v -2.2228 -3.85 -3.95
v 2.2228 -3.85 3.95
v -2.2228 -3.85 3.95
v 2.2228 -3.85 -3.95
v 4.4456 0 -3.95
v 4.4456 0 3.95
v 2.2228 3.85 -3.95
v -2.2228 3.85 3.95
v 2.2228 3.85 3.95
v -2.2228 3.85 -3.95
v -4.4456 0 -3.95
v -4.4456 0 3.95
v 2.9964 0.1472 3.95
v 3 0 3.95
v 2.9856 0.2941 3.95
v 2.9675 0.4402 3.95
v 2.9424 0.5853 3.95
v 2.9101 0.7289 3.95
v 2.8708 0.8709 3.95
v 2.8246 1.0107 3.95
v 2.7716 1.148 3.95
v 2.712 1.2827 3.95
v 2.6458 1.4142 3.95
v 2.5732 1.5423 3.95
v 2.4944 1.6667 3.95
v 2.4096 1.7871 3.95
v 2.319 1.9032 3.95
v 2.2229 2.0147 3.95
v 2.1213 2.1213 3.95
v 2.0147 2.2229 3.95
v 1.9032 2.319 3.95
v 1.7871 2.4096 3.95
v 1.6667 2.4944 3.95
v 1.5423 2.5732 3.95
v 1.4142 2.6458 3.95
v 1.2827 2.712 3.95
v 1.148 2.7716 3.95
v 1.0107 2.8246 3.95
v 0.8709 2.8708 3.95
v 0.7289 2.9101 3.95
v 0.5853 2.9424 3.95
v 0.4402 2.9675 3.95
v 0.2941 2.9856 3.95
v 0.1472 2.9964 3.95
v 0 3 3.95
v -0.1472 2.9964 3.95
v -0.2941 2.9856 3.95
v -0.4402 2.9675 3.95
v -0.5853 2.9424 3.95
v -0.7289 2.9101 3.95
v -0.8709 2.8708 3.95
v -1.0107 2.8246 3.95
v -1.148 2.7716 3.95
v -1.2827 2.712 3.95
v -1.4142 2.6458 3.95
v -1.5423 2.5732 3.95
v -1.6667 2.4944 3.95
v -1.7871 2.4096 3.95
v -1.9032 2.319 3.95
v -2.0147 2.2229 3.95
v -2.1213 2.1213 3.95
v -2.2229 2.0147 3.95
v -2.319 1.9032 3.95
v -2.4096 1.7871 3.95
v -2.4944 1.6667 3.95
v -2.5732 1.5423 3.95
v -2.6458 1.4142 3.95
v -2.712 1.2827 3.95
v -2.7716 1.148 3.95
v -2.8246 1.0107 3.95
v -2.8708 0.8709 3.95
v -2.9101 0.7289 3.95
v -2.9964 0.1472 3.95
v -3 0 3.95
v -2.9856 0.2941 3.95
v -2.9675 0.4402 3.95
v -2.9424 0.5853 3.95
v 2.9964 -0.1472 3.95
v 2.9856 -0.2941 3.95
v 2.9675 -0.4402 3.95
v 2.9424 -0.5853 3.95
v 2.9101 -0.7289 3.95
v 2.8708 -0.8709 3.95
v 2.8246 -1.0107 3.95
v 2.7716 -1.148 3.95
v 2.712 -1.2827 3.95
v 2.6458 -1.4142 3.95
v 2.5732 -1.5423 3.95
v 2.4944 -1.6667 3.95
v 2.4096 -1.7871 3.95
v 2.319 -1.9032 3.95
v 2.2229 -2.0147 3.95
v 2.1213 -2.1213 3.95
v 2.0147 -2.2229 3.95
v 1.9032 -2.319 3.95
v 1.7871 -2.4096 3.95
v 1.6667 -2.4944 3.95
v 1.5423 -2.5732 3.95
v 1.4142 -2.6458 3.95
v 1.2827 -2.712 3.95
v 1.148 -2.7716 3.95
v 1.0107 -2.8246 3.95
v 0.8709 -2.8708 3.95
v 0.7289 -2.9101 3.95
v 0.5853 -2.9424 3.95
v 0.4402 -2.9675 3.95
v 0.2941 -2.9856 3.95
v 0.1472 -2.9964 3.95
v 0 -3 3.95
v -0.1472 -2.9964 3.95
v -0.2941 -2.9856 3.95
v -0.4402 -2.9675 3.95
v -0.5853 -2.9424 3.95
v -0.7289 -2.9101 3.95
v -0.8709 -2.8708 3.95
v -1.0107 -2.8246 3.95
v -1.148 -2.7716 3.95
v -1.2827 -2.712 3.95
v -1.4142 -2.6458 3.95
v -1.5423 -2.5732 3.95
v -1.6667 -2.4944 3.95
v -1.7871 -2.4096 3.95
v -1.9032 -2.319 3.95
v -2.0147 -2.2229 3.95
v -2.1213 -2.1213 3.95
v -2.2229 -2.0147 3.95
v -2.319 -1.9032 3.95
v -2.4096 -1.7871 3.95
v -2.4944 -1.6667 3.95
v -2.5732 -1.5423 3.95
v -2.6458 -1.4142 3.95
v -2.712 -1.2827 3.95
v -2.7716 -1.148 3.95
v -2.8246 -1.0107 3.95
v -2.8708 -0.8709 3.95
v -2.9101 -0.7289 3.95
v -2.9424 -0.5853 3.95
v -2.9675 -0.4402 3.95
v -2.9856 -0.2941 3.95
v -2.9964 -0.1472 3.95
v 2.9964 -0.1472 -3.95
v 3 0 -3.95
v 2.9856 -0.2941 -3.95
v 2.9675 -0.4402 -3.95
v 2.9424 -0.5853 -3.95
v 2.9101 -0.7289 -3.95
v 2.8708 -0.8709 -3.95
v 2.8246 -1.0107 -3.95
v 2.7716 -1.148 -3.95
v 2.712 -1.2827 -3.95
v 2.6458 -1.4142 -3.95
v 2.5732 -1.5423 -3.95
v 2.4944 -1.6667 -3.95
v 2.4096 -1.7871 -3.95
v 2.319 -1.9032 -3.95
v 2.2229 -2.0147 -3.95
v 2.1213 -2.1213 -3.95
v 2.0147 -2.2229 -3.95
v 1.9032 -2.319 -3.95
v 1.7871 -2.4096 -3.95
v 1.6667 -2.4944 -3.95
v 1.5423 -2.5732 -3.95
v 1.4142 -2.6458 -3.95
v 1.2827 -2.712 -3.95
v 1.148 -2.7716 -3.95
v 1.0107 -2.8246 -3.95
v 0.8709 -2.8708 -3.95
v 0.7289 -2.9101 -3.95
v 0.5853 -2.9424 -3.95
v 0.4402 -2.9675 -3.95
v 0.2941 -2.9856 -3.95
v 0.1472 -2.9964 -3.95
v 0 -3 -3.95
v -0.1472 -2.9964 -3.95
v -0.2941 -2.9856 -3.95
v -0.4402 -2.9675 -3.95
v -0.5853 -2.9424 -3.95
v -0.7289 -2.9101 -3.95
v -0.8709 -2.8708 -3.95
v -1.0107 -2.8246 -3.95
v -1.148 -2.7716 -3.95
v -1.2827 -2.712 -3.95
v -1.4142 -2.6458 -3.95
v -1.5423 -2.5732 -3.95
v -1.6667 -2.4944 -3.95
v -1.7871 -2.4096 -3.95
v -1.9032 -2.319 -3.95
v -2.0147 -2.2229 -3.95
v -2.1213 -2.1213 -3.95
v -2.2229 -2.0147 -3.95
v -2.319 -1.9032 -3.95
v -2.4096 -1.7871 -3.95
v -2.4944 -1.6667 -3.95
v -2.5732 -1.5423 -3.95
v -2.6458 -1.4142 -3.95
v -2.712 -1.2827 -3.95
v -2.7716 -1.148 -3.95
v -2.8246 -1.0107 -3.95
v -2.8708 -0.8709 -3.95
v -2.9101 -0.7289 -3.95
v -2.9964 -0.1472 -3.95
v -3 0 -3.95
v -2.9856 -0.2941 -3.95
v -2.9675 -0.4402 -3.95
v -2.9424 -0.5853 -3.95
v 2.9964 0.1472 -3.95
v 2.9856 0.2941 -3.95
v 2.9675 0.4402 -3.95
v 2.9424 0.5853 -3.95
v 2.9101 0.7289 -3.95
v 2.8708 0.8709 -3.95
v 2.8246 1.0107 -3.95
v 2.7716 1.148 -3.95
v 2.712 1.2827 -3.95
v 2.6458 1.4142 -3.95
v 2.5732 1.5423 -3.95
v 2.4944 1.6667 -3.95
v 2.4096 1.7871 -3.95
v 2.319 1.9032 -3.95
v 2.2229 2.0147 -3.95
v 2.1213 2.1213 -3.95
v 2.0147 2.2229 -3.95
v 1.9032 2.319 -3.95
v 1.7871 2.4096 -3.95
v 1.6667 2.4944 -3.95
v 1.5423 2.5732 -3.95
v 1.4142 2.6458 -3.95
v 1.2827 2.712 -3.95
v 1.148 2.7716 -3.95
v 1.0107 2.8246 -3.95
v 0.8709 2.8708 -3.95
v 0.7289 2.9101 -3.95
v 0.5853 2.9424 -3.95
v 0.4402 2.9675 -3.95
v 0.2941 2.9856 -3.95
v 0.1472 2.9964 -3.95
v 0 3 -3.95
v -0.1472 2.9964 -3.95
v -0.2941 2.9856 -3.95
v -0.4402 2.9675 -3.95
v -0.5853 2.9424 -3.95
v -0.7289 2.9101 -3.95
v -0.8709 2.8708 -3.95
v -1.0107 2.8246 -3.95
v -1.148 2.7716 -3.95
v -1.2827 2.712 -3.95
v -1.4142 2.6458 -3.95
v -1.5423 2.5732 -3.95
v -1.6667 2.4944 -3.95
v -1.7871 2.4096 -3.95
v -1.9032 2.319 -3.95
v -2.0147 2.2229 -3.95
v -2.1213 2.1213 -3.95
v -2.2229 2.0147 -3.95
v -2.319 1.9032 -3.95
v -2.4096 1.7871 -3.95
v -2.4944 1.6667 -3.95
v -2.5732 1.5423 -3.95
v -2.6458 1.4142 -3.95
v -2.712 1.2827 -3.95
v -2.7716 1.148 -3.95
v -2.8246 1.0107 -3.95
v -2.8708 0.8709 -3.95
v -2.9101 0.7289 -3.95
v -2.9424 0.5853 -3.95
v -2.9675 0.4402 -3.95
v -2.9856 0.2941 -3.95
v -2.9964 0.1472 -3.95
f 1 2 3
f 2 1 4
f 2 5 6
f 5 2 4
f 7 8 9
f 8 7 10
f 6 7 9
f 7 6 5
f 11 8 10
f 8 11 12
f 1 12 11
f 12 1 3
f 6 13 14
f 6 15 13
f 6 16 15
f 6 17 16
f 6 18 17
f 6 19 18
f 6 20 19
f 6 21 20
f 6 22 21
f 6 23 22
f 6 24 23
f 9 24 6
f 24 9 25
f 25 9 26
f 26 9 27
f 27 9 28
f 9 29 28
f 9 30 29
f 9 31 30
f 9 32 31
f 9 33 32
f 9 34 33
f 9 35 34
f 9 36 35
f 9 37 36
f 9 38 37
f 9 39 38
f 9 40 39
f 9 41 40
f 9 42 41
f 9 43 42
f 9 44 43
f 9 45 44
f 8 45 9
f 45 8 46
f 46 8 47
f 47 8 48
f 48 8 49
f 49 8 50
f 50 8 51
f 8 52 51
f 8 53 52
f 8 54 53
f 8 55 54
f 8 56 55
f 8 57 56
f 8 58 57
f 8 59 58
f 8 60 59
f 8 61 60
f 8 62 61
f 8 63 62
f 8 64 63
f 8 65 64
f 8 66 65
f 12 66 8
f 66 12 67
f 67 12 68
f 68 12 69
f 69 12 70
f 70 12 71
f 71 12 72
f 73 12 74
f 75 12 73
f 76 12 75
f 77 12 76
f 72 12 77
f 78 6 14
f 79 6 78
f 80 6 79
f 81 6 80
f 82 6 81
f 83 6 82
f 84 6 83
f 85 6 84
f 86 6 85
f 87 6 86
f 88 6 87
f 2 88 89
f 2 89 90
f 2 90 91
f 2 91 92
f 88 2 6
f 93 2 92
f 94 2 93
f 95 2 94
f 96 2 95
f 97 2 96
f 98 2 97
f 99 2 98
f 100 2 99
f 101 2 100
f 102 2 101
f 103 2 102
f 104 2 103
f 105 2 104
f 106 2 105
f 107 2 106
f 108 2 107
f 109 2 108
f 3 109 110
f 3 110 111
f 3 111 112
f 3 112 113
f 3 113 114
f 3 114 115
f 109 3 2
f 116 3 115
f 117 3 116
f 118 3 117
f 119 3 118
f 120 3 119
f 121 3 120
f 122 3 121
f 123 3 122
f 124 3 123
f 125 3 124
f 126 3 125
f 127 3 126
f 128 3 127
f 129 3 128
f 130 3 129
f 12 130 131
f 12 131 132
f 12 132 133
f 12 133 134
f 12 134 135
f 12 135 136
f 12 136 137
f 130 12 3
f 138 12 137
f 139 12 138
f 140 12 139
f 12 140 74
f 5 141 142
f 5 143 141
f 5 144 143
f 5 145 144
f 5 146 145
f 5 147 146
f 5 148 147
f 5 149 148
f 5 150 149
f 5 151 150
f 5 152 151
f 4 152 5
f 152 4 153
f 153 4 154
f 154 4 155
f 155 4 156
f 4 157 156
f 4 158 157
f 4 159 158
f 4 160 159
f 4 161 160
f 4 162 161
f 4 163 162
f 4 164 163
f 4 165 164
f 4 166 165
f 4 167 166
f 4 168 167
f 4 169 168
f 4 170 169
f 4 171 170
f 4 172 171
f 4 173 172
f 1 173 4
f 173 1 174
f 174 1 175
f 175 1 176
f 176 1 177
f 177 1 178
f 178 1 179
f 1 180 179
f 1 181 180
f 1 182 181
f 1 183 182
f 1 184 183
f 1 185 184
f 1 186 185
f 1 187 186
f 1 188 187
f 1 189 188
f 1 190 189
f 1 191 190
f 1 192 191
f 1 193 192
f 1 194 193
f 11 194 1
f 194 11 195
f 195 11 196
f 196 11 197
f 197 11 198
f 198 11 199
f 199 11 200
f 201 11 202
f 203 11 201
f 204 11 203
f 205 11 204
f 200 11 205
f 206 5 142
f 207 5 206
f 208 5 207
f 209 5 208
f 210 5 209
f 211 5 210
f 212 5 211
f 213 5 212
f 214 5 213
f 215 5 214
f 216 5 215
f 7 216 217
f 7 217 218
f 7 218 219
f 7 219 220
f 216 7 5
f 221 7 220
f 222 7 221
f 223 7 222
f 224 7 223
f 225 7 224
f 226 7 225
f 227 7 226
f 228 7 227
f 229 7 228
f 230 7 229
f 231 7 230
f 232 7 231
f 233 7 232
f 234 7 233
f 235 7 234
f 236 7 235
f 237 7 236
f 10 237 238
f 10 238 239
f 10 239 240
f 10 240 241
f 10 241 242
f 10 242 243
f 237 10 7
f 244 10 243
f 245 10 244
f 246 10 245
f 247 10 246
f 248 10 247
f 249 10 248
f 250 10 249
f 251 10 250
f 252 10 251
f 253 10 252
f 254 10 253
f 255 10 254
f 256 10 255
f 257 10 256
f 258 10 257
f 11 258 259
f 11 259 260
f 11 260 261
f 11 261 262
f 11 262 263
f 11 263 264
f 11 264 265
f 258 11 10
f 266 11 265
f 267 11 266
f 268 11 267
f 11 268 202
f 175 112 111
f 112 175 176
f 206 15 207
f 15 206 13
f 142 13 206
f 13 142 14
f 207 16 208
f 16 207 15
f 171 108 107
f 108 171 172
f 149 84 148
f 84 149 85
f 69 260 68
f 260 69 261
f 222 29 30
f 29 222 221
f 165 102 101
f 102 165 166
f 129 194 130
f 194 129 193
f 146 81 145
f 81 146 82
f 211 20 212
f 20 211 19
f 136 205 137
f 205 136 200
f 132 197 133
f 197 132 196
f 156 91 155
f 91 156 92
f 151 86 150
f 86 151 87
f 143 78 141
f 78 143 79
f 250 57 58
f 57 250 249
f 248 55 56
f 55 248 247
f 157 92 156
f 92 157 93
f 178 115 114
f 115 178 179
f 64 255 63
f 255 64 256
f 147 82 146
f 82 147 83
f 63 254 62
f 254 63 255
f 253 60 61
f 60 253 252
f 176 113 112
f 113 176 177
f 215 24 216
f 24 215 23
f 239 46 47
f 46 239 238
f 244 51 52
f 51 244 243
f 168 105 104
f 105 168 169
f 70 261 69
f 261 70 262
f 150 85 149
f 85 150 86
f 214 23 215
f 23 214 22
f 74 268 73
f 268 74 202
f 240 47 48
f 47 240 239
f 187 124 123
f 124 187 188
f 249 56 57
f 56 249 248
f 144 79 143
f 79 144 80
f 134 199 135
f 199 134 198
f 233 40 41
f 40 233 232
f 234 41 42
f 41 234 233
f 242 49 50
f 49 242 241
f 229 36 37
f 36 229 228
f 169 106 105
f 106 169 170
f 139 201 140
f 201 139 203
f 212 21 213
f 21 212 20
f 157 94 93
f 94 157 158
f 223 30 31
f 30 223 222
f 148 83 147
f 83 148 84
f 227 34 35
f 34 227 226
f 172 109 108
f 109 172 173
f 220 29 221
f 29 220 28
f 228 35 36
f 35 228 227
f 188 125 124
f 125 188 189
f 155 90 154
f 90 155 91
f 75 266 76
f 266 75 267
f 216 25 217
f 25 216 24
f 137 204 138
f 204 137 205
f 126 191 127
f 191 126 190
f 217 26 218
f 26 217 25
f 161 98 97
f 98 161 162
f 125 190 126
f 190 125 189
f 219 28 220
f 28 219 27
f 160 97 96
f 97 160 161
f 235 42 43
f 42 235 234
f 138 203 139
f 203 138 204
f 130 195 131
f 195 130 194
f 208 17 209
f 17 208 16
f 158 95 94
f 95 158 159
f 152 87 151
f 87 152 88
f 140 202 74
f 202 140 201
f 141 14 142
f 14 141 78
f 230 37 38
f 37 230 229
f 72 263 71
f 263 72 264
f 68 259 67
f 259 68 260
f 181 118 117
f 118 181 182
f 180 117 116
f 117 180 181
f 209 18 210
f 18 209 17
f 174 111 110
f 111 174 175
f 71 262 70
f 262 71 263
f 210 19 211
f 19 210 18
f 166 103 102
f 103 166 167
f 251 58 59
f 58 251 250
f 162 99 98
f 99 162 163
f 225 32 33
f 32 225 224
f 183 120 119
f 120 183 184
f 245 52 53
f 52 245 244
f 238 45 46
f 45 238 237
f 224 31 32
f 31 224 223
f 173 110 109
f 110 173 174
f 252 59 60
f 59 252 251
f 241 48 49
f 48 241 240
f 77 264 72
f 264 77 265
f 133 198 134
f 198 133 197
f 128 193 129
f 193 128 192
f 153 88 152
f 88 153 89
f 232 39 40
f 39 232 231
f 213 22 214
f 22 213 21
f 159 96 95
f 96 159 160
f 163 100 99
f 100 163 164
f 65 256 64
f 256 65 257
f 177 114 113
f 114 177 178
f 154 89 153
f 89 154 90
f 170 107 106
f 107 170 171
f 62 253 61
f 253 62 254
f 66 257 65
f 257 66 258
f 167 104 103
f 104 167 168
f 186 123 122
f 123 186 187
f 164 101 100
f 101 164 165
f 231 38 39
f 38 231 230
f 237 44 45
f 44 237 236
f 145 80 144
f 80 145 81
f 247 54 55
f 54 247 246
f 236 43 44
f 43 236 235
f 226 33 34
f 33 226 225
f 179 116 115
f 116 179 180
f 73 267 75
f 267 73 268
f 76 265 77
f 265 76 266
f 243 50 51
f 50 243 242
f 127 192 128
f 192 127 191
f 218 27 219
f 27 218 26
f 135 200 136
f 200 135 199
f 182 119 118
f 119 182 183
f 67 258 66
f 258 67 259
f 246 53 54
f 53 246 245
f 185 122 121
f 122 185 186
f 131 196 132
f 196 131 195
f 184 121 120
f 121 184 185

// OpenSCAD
// Hex nut for 6.0mm screws
// Target: 7.7mm across flats, 7.9mm thick, through-hole 6.0mm

thread_nominal_diameter_mm = 6; //[3:12:0.1]
across_flats_mm = 7.7;          //[3.85:15.4:0.1]
thickness_mm = 7.9;             //[3.95:15.8:0.1]
bore_diameter_mm = 6;           //[3:12:0.1]

// 0 = clearance/tap representation (smooth cylinder), 1 = cosmetic thread (not used here)
bore_type = 0;                  //[0:1:1]

chamfer_top_mm = 0;             //[0:2:0.1]
chamfer_bottom_mm = 0;          //[0:2:0.1]

// Small epsilon for robust boolean ops (keep tiny to avoid visible artifacts)
eps_mm = 0.02;                  //[0.01:0.2:0.01]

// Optional washer (disabled by default). If enabled, it is fused to nut (one connected solid).
washer_enabled = 0;             //[0:1:1]
washer_outer_diameter_mm = 12;  //[6:24:0.1]
washer_thickness_mm = 1.6;      //[0.8:3.2:0.1]

// Derived
hex_R = across_flats_mm / (2 * cos(30)); // circumradius that yields correct across-flats
bore_r = bore_diameter_mm / 2;

module hex_nut_body() {
    // Hex prism centered at origin
    cylinder(r = hex_R, h = thickness_mm, center = true, $fn = 6);
}

module bore_cut() {
    // High $fn to avoid faceted/stepped appearance
    cylinder(r = bore_r, h = thickness_mm + 2*eps_mm, center = true, $fn = 128);
}

module chamfer_cut(z_sign, chamfer_h) {
    // z_sign: +1 for top, -1 for bottom
    // Use a conical frustum to bevel the outer edge without removing the whole face.
    // Outer radius slightly larger than hex_R to guarantee full intersection.
    zc = z_sign * (thickness_mm/2 - chamfer_h/2);
    translate([0, 0, zc])
        cylinder(
            h = chamfer_h + 2*eps_mm,
            r1 = hex_R + eps_mm,
            r2 = max(hex_R - chamfer_h, 0.01),
            center = true,
            $fn = 96
        );
}

module nut() {
    difference() {
        hex_nut_body();
        bore_cut();

        if (chamfer_top_mm > 0)
            chamfer_cut(+1, chamfer_top_mm);

        if (chamfer_bottom_mm > 0)
            chamfer_cut(-1, chamfer_bottom_mm);
    }
}

module washer_solid() {
    // Washer fused to nut: place directly under nut with slight overlap
    overlap = eps_mm;
    zc = -(thickness_mm/2 + washer_thickness_mm/2 - overlap);
    translate([0, 0, zc])
        difference() {
            cylinder(r = washer_outer_diameter_mm/2, h = washer_thickness_mm, center = true, $fn = 128);
            cylinder(r = bore_r, h = washer_thickness_mm + 2*eps_mm, center = true, $fn = 128);
        }
}

module assembly() {
    if (washer_enabled) {
        union() {
            nut();
            washer_solid();
        }
    } else {
        nut();
    }
}

assembly();
